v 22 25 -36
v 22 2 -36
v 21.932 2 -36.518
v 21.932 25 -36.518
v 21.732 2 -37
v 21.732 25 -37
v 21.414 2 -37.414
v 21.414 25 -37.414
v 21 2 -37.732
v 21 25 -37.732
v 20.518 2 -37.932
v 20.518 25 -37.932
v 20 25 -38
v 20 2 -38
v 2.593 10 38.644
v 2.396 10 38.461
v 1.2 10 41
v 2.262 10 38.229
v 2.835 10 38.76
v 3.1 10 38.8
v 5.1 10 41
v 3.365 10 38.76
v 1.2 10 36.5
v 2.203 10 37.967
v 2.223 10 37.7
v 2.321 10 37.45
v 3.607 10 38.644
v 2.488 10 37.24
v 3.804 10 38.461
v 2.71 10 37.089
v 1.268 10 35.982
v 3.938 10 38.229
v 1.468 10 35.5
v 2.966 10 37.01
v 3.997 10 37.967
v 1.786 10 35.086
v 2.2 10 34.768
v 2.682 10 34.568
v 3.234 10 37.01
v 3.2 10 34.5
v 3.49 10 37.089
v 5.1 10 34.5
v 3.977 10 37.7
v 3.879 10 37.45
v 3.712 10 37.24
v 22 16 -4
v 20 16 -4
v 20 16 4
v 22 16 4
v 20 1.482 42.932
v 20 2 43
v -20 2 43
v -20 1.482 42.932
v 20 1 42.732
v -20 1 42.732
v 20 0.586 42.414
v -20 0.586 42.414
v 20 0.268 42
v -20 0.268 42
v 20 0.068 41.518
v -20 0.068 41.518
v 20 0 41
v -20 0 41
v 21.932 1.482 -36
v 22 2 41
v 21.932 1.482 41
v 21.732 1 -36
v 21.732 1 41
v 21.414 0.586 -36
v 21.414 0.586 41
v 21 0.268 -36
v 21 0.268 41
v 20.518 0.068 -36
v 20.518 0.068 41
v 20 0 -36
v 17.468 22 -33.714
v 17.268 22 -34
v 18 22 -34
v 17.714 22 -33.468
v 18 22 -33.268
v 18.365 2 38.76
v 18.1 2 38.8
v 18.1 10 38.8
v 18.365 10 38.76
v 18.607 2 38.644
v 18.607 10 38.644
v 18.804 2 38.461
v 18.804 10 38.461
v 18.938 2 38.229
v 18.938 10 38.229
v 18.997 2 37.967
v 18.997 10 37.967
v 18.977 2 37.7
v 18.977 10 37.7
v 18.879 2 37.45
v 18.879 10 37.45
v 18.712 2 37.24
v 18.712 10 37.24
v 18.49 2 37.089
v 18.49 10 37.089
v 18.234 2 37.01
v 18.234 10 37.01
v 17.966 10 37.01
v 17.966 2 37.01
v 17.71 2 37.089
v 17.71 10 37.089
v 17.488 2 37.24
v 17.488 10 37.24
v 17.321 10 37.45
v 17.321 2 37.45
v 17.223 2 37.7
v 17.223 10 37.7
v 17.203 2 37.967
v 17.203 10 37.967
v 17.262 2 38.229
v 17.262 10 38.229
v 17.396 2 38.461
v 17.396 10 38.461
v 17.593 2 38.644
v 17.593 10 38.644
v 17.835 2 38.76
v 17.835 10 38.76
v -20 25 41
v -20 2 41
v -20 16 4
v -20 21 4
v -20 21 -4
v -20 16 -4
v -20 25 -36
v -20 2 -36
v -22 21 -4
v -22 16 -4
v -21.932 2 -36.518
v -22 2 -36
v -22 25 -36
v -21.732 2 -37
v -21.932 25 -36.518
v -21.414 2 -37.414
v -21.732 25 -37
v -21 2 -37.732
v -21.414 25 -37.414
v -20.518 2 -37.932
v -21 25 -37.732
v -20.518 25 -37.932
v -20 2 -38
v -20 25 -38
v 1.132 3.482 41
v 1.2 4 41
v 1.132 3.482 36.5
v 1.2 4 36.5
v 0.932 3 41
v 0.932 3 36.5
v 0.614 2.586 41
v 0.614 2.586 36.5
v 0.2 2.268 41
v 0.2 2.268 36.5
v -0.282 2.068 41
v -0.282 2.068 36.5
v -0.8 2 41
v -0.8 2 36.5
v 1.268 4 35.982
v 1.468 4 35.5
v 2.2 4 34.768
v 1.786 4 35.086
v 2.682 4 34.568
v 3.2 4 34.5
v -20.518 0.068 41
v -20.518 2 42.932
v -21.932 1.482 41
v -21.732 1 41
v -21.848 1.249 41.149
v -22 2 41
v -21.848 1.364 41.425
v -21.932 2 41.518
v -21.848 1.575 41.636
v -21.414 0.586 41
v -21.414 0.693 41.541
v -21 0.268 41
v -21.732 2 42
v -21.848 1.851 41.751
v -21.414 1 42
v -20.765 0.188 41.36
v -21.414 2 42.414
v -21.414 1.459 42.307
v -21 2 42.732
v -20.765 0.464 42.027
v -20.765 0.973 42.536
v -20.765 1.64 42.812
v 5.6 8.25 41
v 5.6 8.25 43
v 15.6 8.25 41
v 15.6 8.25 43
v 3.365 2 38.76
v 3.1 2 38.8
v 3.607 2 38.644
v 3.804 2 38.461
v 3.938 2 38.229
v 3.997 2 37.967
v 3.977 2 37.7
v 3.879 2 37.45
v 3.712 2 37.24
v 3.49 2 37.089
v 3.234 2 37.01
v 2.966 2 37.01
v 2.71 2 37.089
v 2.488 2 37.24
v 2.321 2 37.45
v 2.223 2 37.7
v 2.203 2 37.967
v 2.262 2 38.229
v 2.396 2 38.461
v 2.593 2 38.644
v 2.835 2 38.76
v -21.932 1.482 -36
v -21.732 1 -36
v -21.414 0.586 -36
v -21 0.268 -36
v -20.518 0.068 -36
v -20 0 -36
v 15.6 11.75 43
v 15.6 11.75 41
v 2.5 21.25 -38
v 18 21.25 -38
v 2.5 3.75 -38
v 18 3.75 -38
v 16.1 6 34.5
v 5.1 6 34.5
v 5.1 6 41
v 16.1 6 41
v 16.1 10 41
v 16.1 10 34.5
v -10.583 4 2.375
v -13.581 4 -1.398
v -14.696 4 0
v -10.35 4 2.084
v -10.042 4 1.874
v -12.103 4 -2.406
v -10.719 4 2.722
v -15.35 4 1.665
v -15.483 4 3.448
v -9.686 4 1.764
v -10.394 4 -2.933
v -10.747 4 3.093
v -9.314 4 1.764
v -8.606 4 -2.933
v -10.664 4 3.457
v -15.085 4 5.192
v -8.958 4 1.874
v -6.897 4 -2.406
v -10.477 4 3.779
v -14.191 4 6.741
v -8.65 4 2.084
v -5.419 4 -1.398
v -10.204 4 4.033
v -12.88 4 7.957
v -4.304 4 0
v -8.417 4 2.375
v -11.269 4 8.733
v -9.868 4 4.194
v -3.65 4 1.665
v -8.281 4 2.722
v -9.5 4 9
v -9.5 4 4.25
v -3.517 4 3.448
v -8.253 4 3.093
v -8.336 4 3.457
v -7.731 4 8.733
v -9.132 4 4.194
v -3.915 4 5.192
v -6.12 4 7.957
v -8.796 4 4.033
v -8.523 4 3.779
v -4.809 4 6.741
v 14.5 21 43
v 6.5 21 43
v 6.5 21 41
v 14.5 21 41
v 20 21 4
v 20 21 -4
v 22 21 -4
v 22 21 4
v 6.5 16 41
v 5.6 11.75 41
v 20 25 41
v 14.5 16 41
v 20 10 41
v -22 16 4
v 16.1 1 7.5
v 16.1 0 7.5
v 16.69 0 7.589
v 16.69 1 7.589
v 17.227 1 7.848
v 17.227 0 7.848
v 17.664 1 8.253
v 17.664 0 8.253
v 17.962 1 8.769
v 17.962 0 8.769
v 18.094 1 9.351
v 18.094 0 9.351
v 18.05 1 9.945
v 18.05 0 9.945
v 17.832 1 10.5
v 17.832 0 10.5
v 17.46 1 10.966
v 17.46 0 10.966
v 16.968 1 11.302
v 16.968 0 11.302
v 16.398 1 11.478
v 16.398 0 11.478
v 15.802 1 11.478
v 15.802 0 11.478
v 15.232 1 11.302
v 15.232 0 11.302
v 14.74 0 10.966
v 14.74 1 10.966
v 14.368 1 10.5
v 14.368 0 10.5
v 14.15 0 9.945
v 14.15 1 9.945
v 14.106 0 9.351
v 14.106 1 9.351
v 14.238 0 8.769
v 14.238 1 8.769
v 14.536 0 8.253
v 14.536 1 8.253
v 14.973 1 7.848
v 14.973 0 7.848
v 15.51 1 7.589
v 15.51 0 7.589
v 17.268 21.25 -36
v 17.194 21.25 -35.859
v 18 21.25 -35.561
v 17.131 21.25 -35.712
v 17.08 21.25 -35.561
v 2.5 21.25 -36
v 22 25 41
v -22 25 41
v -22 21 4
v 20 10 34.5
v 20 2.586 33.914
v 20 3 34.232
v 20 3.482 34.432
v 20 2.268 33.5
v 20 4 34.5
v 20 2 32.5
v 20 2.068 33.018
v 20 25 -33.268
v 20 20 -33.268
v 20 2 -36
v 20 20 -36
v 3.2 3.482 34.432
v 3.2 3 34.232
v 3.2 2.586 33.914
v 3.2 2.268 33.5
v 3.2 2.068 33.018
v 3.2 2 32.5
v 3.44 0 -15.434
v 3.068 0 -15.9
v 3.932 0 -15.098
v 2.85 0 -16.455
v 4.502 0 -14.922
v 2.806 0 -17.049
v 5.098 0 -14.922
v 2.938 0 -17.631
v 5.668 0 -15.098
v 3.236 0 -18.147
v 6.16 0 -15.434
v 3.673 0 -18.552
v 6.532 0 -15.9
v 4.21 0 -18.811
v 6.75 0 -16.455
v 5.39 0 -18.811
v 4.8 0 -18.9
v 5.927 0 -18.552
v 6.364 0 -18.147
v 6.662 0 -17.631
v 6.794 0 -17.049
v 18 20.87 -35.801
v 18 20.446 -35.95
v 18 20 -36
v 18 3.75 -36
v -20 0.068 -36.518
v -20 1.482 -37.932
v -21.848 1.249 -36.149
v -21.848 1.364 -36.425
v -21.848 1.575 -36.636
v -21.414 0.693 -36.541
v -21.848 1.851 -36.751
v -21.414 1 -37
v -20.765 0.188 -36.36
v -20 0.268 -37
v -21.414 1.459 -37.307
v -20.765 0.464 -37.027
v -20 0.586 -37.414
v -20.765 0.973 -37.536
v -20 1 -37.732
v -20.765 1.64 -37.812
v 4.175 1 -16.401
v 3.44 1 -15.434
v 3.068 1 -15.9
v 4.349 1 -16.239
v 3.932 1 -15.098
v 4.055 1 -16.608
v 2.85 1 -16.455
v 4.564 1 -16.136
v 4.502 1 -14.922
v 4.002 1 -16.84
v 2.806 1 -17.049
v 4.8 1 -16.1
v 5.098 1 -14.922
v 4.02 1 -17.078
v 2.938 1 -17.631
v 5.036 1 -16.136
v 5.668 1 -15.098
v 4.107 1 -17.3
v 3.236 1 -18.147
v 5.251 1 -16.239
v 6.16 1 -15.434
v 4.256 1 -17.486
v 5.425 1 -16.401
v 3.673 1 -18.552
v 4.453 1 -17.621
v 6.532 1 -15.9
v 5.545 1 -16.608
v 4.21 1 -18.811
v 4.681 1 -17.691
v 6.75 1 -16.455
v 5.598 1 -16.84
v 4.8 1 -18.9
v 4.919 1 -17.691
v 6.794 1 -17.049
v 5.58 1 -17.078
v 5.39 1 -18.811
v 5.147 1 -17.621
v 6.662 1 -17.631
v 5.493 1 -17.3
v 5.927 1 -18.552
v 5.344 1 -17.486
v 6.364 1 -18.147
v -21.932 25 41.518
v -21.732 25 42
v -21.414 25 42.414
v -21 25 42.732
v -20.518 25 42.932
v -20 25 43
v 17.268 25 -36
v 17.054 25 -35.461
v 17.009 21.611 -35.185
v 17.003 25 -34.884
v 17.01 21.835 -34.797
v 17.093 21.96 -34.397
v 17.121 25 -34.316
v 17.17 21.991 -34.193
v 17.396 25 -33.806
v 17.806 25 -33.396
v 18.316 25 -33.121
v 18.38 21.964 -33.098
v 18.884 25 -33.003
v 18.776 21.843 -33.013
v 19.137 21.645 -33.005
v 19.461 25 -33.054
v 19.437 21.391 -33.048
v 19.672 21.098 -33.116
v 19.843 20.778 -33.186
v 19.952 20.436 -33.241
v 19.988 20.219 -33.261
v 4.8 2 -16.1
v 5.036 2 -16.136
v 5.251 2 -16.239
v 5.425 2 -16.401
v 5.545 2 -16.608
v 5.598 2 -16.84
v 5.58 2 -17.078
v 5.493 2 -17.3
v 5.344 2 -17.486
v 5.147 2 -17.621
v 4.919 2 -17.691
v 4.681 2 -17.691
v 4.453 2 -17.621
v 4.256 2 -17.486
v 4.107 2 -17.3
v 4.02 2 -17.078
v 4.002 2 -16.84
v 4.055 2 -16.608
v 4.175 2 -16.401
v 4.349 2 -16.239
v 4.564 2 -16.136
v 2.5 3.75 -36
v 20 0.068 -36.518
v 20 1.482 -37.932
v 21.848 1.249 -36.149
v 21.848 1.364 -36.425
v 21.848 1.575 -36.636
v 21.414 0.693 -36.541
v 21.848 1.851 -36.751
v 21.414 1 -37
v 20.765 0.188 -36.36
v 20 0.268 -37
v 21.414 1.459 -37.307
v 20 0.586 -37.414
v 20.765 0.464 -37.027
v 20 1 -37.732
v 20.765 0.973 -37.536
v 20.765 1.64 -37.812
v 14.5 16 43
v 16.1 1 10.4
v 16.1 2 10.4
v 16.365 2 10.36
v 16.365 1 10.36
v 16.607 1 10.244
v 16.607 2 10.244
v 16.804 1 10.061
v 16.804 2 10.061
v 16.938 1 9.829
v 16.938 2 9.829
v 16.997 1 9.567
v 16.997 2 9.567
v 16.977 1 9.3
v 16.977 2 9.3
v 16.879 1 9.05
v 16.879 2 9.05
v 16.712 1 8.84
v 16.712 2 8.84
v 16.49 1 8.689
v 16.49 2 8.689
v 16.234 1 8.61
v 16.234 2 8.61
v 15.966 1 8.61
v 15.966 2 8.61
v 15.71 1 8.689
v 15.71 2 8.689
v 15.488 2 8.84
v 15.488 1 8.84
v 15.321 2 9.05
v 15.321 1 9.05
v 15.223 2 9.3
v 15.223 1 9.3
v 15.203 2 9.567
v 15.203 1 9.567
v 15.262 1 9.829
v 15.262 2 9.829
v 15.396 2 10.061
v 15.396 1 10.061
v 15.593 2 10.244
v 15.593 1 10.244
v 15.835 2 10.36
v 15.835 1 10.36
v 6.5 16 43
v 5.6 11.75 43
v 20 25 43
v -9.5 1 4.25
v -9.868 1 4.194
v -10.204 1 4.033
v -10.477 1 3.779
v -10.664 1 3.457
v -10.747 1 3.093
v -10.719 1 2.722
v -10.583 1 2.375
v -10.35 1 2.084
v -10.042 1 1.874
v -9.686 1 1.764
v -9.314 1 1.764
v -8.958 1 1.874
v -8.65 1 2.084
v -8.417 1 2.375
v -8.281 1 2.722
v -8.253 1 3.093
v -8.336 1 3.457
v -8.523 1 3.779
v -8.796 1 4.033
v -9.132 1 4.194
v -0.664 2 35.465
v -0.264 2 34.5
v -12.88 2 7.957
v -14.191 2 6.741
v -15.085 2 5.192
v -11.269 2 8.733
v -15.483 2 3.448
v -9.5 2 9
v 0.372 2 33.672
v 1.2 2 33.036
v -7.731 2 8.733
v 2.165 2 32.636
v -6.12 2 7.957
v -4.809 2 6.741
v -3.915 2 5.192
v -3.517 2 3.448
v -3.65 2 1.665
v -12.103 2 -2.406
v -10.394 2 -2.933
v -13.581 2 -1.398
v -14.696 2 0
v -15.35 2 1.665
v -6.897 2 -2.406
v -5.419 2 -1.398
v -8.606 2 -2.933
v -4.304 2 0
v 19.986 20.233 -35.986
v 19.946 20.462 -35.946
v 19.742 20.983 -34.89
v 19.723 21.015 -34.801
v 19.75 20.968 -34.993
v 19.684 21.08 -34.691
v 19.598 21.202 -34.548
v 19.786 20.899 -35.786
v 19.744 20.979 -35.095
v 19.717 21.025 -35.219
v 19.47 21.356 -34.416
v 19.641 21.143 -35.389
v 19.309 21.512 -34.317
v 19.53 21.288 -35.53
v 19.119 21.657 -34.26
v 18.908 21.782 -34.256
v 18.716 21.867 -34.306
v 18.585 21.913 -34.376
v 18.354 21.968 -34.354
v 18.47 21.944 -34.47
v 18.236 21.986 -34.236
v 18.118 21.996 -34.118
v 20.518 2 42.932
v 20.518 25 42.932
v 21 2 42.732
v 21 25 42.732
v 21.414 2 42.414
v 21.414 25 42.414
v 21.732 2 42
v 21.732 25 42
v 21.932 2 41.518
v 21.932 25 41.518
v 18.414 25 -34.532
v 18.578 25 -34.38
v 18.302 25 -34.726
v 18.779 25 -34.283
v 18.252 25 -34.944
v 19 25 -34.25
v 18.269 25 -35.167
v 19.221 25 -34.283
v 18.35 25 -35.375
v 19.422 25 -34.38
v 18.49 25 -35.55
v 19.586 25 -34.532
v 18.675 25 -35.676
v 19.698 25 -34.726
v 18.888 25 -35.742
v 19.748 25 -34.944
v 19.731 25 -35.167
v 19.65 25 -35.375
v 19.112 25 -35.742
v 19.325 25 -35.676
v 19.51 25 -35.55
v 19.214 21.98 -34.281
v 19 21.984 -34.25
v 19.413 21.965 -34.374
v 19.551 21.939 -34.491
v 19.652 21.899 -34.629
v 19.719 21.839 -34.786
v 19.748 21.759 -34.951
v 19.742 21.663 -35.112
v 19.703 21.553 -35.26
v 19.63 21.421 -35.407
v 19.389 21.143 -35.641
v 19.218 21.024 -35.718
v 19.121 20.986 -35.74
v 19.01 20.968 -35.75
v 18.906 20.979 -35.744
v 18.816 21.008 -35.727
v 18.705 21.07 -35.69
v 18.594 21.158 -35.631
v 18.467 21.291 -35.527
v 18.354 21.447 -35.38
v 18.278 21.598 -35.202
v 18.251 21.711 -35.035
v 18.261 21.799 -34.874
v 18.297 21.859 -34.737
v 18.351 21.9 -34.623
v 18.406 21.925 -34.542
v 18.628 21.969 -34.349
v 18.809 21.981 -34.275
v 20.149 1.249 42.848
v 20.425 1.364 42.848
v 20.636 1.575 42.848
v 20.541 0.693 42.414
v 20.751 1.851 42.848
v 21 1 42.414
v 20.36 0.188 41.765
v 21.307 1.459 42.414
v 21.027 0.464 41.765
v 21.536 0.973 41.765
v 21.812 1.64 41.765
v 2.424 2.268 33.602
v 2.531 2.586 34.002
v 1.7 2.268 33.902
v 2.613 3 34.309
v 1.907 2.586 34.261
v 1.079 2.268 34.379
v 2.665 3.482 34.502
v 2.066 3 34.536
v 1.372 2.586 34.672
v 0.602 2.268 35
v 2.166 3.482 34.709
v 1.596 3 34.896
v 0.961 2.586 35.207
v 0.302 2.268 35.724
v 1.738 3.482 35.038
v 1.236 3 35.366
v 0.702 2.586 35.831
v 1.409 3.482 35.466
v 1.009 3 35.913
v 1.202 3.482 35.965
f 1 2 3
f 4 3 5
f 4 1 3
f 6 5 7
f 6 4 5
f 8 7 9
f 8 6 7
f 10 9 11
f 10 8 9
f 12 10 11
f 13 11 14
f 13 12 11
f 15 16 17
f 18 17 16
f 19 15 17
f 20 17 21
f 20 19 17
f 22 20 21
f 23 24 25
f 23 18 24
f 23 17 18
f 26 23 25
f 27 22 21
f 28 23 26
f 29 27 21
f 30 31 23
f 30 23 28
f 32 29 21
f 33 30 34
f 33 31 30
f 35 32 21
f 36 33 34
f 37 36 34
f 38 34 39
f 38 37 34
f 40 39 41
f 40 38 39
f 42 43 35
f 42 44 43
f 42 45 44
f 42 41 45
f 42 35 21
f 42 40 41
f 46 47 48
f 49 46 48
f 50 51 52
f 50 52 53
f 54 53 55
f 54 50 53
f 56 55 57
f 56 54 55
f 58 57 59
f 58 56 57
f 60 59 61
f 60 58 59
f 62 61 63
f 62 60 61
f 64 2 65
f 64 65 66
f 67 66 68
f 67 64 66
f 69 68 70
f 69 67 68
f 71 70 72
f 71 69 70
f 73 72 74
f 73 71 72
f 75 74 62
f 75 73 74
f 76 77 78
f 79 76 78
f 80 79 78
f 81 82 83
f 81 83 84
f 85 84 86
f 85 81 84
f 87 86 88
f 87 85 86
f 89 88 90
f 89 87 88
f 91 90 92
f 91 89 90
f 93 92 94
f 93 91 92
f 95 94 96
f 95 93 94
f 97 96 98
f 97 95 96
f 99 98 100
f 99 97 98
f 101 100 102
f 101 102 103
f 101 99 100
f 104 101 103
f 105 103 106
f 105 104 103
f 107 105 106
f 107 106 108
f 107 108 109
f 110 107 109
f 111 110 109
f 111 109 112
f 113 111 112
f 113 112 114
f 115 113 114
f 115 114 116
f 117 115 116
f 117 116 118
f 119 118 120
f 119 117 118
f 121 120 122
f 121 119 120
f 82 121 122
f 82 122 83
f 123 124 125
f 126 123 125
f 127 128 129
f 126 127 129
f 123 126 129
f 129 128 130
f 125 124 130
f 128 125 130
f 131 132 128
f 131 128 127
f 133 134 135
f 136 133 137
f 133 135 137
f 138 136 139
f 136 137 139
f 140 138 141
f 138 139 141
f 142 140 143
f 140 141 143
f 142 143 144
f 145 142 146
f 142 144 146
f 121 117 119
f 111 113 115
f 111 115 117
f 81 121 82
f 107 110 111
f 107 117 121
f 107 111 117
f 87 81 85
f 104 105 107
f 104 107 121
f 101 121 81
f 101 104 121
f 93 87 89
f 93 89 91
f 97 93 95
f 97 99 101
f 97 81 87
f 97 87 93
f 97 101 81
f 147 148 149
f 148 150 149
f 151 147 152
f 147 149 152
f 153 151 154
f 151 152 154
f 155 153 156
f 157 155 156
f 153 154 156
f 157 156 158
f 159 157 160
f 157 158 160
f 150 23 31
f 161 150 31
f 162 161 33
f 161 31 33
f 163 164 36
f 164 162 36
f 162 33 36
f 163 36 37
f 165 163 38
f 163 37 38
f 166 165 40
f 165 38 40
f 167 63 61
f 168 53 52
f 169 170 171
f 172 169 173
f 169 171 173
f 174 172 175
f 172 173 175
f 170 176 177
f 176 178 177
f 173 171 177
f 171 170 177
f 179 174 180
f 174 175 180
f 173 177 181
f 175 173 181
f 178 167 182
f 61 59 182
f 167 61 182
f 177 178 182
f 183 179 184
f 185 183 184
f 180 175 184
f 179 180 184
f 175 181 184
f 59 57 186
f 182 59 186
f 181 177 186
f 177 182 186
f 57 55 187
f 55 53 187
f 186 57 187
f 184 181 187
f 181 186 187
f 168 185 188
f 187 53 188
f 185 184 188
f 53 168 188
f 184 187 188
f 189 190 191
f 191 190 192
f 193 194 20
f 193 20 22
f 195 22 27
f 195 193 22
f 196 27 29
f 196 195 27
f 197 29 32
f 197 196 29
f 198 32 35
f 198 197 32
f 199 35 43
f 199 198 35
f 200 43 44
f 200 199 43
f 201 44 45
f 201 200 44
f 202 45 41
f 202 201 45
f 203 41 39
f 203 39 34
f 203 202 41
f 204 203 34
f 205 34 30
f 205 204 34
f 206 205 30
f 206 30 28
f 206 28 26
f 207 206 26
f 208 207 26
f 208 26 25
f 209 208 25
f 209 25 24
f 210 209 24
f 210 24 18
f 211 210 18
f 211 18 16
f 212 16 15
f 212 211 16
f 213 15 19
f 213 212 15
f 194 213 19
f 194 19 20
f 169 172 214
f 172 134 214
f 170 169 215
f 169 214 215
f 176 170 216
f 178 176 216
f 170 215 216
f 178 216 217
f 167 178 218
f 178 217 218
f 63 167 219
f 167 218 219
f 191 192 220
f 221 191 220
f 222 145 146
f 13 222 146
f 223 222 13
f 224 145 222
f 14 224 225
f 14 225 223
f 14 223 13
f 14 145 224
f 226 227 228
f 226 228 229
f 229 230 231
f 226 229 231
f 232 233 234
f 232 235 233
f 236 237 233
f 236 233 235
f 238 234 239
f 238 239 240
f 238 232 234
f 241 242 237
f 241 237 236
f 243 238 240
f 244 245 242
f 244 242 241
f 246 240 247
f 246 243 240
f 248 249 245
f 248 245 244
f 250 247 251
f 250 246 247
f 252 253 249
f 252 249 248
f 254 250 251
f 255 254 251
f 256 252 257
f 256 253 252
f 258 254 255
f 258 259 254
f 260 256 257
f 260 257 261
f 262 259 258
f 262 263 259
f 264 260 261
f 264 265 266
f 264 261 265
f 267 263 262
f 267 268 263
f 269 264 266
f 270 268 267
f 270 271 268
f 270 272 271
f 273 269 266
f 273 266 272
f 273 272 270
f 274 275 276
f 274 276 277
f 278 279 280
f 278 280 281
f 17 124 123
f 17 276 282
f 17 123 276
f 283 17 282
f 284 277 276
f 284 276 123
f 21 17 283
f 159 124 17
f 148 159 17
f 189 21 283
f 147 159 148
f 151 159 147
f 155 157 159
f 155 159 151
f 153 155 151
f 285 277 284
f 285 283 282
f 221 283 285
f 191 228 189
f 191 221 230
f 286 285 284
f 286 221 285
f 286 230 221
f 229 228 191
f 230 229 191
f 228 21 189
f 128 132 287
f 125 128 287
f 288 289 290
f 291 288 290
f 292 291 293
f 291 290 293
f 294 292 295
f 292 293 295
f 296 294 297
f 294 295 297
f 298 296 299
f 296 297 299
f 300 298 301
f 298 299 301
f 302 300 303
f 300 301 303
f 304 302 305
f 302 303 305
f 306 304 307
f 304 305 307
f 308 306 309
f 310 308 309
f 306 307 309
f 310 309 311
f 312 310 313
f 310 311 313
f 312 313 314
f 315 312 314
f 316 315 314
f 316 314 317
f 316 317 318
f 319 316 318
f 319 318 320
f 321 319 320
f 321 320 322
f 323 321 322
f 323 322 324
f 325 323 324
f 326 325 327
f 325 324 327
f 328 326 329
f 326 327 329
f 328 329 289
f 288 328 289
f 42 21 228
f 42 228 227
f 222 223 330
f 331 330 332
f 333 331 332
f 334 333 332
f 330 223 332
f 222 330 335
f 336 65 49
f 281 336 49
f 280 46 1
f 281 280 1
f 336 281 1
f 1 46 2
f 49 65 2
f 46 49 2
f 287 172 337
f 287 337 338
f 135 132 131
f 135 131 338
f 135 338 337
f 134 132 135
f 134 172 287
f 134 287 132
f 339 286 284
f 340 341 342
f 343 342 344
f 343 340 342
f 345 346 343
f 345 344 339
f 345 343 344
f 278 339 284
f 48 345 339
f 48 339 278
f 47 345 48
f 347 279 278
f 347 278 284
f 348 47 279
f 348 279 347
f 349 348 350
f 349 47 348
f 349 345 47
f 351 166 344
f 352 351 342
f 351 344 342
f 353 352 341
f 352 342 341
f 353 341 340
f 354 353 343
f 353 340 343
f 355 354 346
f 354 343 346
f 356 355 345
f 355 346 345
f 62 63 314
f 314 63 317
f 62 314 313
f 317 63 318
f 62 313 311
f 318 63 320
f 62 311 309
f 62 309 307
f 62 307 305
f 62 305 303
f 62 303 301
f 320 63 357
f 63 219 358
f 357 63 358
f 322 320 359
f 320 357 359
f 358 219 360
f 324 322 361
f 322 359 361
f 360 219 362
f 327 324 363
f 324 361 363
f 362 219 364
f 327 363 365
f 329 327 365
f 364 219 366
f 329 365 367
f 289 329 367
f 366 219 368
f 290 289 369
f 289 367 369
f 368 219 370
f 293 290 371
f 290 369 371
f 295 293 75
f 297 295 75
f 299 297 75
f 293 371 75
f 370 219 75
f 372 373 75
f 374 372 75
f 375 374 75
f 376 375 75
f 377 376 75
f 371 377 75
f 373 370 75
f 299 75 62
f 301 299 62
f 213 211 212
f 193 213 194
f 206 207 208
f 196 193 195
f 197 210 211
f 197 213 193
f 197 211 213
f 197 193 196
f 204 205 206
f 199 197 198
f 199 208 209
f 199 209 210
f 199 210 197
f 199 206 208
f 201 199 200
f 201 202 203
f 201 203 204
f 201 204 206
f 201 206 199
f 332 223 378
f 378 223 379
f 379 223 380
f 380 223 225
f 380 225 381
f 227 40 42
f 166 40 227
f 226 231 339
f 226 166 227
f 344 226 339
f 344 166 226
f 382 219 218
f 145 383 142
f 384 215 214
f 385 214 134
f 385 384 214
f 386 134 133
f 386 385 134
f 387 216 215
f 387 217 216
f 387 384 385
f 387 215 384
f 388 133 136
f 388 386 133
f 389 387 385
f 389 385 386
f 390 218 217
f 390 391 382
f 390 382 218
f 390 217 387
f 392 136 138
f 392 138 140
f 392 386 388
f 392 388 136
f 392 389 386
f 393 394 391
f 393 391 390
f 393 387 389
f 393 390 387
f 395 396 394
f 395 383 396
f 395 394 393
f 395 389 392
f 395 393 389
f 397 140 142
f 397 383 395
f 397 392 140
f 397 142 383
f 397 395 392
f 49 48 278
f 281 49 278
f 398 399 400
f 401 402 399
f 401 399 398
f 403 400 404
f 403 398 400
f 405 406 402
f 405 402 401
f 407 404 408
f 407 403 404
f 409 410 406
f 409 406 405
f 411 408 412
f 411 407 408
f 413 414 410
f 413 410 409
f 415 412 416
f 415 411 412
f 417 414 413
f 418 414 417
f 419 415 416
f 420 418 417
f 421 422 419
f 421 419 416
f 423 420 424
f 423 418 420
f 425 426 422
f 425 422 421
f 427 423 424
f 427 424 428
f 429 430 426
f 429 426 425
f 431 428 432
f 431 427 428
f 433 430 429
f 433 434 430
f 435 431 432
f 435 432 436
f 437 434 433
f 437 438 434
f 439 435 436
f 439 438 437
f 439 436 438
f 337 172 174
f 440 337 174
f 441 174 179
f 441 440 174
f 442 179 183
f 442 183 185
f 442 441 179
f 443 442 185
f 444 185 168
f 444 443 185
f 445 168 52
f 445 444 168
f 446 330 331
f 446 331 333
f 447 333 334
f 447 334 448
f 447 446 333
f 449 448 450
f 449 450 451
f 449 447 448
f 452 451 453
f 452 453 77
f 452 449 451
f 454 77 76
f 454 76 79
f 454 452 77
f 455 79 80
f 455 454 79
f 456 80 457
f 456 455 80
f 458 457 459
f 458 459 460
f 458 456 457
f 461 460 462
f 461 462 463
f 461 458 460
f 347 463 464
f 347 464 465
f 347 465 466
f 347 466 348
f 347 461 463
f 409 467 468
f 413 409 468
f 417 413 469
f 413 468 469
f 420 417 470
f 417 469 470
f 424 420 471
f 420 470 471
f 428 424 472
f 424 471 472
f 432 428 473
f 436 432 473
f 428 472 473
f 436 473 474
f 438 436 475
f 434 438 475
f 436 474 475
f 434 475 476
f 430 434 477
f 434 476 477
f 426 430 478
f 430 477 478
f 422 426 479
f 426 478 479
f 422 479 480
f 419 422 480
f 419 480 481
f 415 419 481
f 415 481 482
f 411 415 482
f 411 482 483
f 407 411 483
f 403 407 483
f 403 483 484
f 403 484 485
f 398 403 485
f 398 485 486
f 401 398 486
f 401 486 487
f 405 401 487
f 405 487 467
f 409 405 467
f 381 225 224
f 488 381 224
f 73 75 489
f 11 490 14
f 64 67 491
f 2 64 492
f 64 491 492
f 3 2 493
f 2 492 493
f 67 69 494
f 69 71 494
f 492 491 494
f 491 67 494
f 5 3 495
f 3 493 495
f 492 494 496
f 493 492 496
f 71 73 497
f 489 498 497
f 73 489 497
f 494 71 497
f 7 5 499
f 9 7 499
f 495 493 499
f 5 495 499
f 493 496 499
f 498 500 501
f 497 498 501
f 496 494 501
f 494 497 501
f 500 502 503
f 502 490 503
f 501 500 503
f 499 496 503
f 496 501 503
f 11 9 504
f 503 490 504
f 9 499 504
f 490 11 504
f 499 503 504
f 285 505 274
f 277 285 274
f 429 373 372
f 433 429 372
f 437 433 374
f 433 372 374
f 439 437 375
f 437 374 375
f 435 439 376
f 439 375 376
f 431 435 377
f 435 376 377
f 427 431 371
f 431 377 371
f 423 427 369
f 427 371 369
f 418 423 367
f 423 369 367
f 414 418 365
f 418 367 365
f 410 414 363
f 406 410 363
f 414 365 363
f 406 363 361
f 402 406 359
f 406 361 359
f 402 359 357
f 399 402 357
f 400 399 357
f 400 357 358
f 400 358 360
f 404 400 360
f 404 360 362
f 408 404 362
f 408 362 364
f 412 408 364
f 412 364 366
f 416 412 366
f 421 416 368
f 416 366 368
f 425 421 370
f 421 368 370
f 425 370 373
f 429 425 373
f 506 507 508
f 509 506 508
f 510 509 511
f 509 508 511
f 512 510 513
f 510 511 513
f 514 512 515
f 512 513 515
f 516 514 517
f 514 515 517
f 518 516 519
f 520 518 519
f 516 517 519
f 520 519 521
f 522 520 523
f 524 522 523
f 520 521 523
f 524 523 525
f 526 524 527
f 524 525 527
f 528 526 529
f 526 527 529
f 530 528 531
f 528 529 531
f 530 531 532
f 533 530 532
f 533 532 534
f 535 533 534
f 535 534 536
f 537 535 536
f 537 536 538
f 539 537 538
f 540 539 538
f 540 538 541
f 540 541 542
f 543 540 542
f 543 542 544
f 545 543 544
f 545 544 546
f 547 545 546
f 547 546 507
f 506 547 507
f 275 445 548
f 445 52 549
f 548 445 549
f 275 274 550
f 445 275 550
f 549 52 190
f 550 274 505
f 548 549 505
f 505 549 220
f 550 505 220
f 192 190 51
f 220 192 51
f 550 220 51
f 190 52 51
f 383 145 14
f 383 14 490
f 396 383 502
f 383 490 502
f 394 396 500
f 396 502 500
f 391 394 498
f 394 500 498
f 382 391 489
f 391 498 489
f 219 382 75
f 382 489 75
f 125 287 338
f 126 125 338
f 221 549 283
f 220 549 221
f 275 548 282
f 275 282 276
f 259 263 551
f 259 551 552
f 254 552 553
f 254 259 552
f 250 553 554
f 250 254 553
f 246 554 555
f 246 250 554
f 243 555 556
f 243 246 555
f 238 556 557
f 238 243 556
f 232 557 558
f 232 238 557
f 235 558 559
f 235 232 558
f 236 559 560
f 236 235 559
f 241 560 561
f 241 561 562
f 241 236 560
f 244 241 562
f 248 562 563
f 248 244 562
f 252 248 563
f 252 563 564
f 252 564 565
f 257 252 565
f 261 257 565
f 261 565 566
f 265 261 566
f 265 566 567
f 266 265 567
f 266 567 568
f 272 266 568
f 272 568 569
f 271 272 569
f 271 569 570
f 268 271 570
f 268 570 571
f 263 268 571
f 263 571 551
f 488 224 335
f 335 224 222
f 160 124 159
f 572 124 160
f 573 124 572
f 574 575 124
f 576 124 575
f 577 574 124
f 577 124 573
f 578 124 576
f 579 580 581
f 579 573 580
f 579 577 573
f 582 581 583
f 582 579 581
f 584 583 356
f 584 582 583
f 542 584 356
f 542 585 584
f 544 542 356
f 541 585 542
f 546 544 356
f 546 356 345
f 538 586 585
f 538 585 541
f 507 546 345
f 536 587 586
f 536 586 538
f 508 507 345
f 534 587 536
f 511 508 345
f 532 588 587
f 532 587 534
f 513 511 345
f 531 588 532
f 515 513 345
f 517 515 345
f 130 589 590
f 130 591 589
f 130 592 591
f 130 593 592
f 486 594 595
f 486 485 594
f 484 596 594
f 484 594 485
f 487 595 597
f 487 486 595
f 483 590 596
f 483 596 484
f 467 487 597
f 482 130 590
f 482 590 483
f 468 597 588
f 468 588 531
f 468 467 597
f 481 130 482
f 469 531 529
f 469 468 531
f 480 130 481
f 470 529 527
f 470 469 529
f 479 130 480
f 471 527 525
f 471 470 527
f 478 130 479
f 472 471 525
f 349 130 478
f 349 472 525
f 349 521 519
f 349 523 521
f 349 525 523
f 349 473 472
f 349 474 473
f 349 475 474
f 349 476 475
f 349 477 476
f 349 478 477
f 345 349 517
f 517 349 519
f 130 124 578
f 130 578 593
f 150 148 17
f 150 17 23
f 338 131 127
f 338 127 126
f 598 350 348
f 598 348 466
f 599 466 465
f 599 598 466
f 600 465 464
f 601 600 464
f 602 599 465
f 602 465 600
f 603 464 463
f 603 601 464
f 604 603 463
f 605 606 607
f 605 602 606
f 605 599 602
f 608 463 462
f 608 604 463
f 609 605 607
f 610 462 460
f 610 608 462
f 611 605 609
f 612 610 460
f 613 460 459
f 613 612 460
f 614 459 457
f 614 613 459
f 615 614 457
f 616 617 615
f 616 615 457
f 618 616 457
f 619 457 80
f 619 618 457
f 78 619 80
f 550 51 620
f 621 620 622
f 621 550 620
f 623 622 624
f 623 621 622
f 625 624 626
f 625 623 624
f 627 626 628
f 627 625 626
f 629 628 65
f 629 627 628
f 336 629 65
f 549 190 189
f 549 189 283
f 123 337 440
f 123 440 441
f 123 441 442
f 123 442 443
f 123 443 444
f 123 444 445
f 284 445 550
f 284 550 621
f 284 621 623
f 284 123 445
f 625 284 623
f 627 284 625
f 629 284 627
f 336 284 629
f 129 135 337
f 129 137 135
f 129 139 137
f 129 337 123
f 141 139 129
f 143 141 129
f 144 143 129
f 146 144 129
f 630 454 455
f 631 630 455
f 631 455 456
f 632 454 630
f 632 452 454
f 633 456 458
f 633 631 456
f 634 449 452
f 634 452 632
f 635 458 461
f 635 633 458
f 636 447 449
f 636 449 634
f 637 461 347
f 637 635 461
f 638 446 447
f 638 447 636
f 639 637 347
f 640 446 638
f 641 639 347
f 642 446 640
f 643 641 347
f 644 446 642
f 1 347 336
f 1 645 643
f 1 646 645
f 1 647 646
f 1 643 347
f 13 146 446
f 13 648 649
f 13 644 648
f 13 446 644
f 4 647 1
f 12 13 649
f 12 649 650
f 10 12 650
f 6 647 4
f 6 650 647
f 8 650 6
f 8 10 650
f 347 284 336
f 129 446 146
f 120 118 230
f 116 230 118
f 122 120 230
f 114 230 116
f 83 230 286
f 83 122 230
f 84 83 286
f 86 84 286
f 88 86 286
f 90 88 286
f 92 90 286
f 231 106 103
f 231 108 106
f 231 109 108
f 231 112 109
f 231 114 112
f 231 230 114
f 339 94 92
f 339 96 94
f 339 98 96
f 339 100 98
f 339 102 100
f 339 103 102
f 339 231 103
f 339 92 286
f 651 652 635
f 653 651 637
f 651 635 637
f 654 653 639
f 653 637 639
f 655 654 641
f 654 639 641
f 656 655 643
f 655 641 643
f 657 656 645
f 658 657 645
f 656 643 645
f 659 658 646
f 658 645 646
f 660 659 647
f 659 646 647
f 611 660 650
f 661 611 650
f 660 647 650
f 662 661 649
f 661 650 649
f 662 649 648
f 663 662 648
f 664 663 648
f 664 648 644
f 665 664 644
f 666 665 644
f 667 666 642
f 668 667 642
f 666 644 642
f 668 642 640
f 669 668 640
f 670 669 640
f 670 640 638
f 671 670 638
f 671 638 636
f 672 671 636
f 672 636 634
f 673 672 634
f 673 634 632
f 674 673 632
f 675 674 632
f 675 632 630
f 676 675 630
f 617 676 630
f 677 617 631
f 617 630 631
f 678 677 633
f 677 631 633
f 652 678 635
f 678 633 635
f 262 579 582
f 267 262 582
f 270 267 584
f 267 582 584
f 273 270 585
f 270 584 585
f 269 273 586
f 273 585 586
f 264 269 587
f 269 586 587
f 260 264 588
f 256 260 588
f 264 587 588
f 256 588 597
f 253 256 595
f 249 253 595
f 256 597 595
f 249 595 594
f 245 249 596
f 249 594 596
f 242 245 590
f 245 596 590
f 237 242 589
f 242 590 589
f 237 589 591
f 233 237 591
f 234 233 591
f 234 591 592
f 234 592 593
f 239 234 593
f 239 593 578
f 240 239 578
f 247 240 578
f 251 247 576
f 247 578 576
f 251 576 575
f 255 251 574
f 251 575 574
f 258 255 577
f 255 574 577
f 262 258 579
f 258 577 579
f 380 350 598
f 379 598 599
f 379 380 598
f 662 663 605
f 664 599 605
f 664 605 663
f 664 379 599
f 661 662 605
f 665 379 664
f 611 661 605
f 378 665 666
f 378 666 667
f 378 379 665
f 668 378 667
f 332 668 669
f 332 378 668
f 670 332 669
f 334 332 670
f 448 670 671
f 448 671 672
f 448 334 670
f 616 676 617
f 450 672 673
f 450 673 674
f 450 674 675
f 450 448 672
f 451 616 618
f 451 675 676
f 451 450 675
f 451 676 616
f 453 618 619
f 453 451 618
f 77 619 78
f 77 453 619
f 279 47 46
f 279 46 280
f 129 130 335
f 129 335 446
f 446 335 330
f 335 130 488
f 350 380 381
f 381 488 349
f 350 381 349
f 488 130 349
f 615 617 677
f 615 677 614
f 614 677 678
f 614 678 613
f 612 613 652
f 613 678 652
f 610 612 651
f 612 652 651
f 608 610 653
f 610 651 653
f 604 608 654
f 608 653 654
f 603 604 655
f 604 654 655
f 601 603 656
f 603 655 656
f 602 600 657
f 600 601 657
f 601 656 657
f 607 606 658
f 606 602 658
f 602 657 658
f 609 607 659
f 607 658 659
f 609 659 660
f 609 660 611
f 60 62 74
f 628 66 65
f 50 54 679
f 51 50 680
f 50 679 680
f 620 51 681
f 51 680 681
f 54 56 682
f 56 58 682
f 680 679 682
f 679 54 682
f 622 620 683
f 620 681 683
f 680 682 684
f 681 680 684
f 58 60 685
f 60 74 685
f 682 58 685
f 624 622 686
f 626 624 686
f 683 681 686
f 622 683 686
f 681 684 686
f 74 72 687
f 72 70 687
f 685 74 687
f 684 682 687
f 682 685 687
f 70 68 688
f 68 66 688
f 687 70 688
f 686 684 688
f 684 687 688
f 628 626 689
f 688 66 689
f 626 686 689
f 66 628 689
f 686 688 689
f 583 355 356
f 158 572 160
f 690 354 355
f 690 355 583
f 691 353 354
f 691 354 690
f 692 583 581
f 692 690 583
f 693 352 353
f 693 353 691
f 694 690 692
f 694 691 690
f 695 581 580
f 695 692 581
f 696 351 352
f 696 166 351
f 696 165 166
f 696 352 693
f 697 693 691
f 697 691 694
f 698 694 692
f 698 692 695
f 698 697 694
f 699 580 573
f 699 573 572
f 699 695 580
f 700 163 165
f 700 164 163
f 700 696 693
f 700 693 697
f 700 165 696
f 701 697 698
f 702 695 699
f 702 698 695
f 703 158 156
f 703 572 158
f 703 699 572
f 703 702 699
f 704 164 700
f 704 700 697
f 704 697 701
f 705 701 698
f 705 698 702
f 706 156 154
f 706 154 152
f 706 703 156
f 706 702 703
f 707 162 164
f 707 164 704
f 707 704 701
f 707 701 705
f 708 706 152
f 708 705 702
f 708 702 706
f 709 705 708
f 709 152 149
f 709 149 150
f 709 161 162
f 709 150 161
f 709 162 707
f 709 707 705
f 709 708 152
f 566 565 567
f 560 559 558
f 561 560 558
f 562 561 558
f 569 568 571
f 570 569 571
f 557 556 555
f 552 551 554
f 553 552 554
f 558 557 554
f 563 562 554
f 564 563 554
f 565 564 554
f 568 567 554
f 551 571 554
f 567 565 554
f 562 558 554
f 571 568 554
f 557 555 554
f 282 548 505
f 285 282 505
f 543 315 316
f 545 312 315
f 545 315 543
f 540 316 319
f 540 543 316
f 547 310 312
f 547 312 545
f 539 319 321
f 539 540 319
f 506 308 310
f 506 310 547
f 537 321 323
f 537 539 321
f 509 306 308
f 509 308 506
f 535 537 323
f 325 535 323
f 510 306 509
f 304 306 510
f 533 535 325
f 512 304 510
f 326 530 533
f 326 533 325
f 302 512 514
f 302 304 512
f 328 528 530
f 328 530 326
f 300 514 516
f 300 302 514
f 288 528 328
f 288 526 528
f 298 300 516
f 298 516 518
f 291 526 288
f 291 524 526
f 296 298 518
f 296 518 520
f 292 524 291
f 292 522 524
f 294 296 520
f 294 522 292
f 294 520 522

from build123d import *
from build123d.topology import SkipClean

# Parameters (mm, degrees)
SKETCH_1_W           = 44
SKETCH_1_H           = 81
EXTRUDE_1_DEPTH      = 25
SHELL_1_T            = -2
FILLET_1_R           = 2
SKETCH_2_R           = 0.8
SKETCH_2_R_2         = 0.9
CUT_EXTRUDE_1_DEPTH  = 24
SKETCH_3_R           = 1.25
CUT_EXTRUDE_2_DEPTH  = 24
SKETCH_4_R           = 6
EXTRUDE_2_DEPTH      = 2
CUT_EXTRUDE_START    = -13.2
SKETCH_6_R           = 1.25
CUT_EXTRUDE_4_DEPTH  = 13.2
SKETCH_7_W           = 15.5
SKETCH_7_H           = 17.5
CUT_EXTRUDE_5_DEPTH  = 13.2
SKETCH_9_W           = 18.8
SKETCH_9_H           = 6.5
SKETCH_9_R           = 0.9
EXTRUDE_3_DEPTH      = 8
SKETCH_11_W          = 11
SKETCH_11_H          = 6.5
CUT_EXTRUDE_6_DEPTH  = 4
SKETCH_12_W          = 10
SKETCH_12_H          = 3.5
CUT_EXTRUDE_7_DEPTH  = 4
FILLET_2_R           = 2
EXTRUDE_START        = -1
SKETCH_14_R          = 1.25
EXTRUDE_4_DEPTH      = 1
SKETCH_15_R          = 2
CUT_EXTRUDE_8_DEPTH  = 1
SKETCH_16_W          = 8
SKETCH_16_H          = 5
CUT_EXTRUDE_9_DEPTH  = 59
SKETCH_17_R          = 2
EXTRUDE_5_DEPTH      = 3
SKETCH_18_R          = 0.75
CUT_EXTRUDE_10_DEPTH = 3
FILLET_3_R           = 2
SKETCH_19_W          = 8
SKETCH_19_H          = 5
CUT_EXTRUDE_11_DEPTH = 3


with BuildPart() as part:
    # 草图1 → 凸台-拉伸1 (new body)
    with BuildSketch(Plane(origin=(0, 0, 0), x_dir=(1, 0, 0), z_dir=(0, 1, 0))):
        with Locations((0, -2.5)):
            Rectangle(SKETCH_1_W, SKETCH_1_H)
    extrude(amount=EXTRUDE_1_DEPTH)

    # 抽壳1
    shell_1_openings = [part.faces().sort_by_distance(p)[0] for p in [
        (0, 25, 2.5),
    ]]
    offset(amount=SHELL_1_T, openings=shell_1_openings, kind=Kind.INTERSECTION)

    # 圆角1
    fillet_1_edges = [part.edges().sort_by_distance(p)[0] for p in [
        (0, 0, -38),
        (22, 0, 2.5),
        (0, 0, 43),
        (-22, 0, 2.5),
        (-22, 12.5, -38),
        (22, 12.5, -38),
        (22, 12.5, 43),
        (-22, 12.5, 43),
    ]]
    fillet(fillet_1_edges, radius=FILLET_1_R)

    # 草图2 → 切除-拉伸1 (cut)
    with BuildSketch(Plane(origin=(0, 2, 0), x_dir=(1, 0, 0), z_dir=(0, 1, 0))):
        with Locations(Location((4.8, 16.9, 0), (0, 0, 270))):
            Circle(SKETCH_2_R)
        with Locations(Location((16.1, -9.5, 0), (0, 0, 270))):
            Circle(SKETCH_2_R_2)
    extrude(amount=-CUT_EXTRUDE_1_DEPTH, mode=Mode.SUBTRACT)

    # 草图3 → 切除-拉伸2 (cut)
    with BuildSketch(Plane(origin=(0, 2, 0), x_dir=(1, 0, 0), z_dir=(0, 1, 0))):
        with Locations(Location((-9.5, -3, 0), (0, 0, 270))):
            Circle(SKETCH_3_R)
    extrude(amount=-CUT_EXTRUDE_2_DEPTH, mode=Mode.SUBTRACT)

    # 草图4 → 凸台-拉伸2 (add)
    with BuildSketch(Plane(origin=(0, 2, 0), x_dir=(1, 0, 0), z_dir=(0, 1, 0))):
        with Locations(Location((-9.5, -3, 0), (0, 0, 270))):
            Circle(SKETCH_4_R)
    extrude(amount=EXTRUDE_2_DEPTH)

    # 草图6 → 切除-拉伸4 (cut)
    with BuildSketch(Plane.XZ.offset(CUT_EXTRUDE_START)):
        with Locations(Location((-9.5, 3, 0), (0, 0, 90))):
            Circle(SKETCH_6_R)
    extrude(amount=CUT_EXTRUDE_4_DEPTH, mode=Mode.SUBTRACT)

    # 草图7 → 切除-拉伸5 (cut)
    with BuildSketch(Plane(origin=(0, 0, -38), x_dir=(-1, 0, 0), z_dir=(0, 0, -1))):
        with Locations((-10.25, 12.5)):
            Rectangle(SKETCH_7_W, SKETCH_7_H)
    extrude(amount=-CUT_EXTRUDE_5_DEPTH, mode=Mode.SUBTRACT)

    # 草图9 → 凸台-拉伸3 (add)
    with BuildSketch(Plane(origin=(0, 2, 0), x_dir=(1, 0, 0), z_dir=(0, 1, 0))):
        with Locations((10.6, -37.75)):
            Rectangle(SKETCH_9_W, SKETCH_9_H)
        with Locations(Location((18.1, -37.9, 0), (0, 0, 270))):
            Circle(SKETCH_9_R, mode=Mode.SUBTRACT)
        with Locations(Location((3.1, -37.9, 0), (0, 0, 270))):
            Circle(SKETCH_9_R, mode=Mode.SUBTRACT)
    extrude(amount=EXTRUDE_3_DEPTH)

    # 草图11 → 切除-拉伸6 (cut)
    with BuildSketch(Plane(origin=(0, 10, 0), x_dir=(1, 0, 0), z_dir=(0, 1, 0))):
        with Locations((10.6, -37.75)):
            Rectangle(SKETCH_11_W, SKETCH_11_H)
    extrude(amount=-CUT_EXTRUDE_6_DEPTH, mode=Mode.SUBTRACT)

    # 草图12 → 切除-拉伸7 (cut)
    with BuildSketch(Plane.XY.offset(43)):
        with Locations((10.6, 10)):
            Rectangle(SKETCH_12_W, SKETCH_12_H)
    extrude(amount=-CUT_EXTRUDE_7_DEPTH, mode=Mode.SUBTRACT)

    # 圆角2
    fillet_2_edges = [part.edges().sort_by_distance(p)[0] for p in [
        (10.6, 2, 34.5),
        (1.2, 2, 37.75),
        (1.2, 6, 34.5),
    ]]
    fillet(fillet_2_edges, radius=FILLET_2_R)

    # 草图14 → 凸台-拉伸4 (add)
    with BuildSketch(Plane.XZ.offset(EXTRUDE_START)):
        with Locations(Location((-9.5, 3, 0), (0, 0, 90))):
            Circle(SKETCH_14_R)
    extrude(amount=EXTRUDE_4_DEPTH)

    # 草图15 → 切除-拉伸8 (cut)
    with BuildSketch(Plane.XZ):
        with Locations(Location((16.1, 9.5, 0), (0, 0, 270))):
            Circle(SKETCH_15_R)
        with Locations(Location((4.8, -16.9, 0), (0, 0, 270))):
            Circle(SKETCH_15_R)
    extrude(amount=-CUT_EXTRUDE_8_DEPTH, mode=Mode.SUBTRACT)

    # 草图16 → 切除-拉伸9 (cut)
    with BuildSketch(Plane.ZY.offset(22)):
        with Locations((0, 18.5)):
            Rectangle(SKETCH_16_W, SKETCH_16_H)
    extrude(amount=-CUT_EXTRUDE_9_DEPTH, mode=Mode.SUBTRACT)

    # 草图17 → 凸台-拉伸5 (add)
    with BuildSketch(Plane(origin=(0, 25, 0), x_dir=(1, 0, 0), z_dir=(0, 1, 0))):
        with Locations((19, 35)):
            Circle(SKETCH_17_R)
    extrude(amount=-EXTRUDE_5_DEPTH)

    # 草图18 → 切除-拉伸10 (cut)
    with BuildSketch(Plane(origin=(0, 25, 0), x_dir=(1, 0, 0), z_dir=(0, 1, 0))):
        with Locations(Location((19, 35, 0), (0, 0, 270))):
            Circle(SKETCH_18_R)
    extrude(amount=-CUT_EXTRUDE_10_DEPTH, mode=Mode.SUBTRACT)

    # 圆角3
    # the kernel refuses this fillet: 2 mm, written as the material it adds along each edge
    with BuildSketch(Plane(origin=(12.267949192, 22, -36), x_dir=(0, -1, 0), z_dir=(1, 0, 0))) as fillet_3_piece_1_section:
        with BuildLine():
            CenterArc((FILLET_3_R, -FILLET_3_R), FILLET_3_R, 90, 90)
            Line((0, -FILLET_3_R), (0, 0))
            Line((0, 0), (FILLET_3_R, 0))
        make_face()
    fillet_3_piece_1 = extrude(amount=7.732050808, mode=Mode.PRIVATE)
    fillet_3_piece_1 = fillet_3_piece_1 & Plane(origin=(19, 21.743486993, -35), x_dir=(1, 0, 0), z_dir=(0, 1, 0)) * Cylinder(2, 24, mode=Mode.PRIVATE)
    fillet_3_piece_1 = split(fillet_3_piece_1, bisect_by=Plane(origin=(18, 21.743486993, -35.418577815), z_dir=(-1, 0, 0)), keep=Keep.TOP, mode=Mode.PRIVATE)
    fillet_3_piece_1 = split(fillet_3_piece_1, bisect_by=Plane(origin=(17.546708028, 21.25, -35.418577815), z_dir=(0, 1, 0)), keep=Keep.TOP, mode=Mode.PRIVATE)
    add(fillet_3_piece_1)
    with BuildSketch(Plane(origin=(12.267949192, 22, -36), x_dir=(0, -1, 0), z_dir=(1, 0, 0))) as fillet_3_piece_2_section:
        with BuildLine():
            CenterArc((FILLET_3_R, -FILLET_3_R), FILLET_3_R, 90, 90)
            Line((0, -FILLET_3_R), (0, 0))
            Line((0, 0), (FILLET_3_R, 0))
        make_face()
    fillet_3_piece_2 = extrude(amount=7.732050808, mode=Mode.PRIVATE)
    fillet_3_piece_2 = split(fillet_3_piece_2, bisect_by=Plane(origin=(18, 20.864048259, -35.911747477), z_dir=(1, 0, 0)), keep=Keep.TOP, mode=Mode.PRIVATE)
    fillet_3_piece_2 = split(fillet_3_piece_2, bisect_by=Plane(origin=(18.99999999, 21.25, -35.911747477), z_dir=(0, -1, 0)), keep=Keep.TOP, mode=Mode.PRIVATE)
    fillet_3_piece_2 = fillet_3_piece_2 - Plane(origin=(19, 20.864048259, -35), x_dir=(0, 0, 1), z_dir=(0, 1, 0)) * Cylinder(0.75, 24, mode=Mode.PRIVATE)
    add(fillet_3_piece_2)
    with BuildSketch(Plane(origin=(12.267949192, 22, -36), x_dir=(0, -1, 0), z_dir=(1, 0, 0))) as fillet_3_piece_3_section:
        with BuildLine():
            CenterArc((FILLET_3_R, -FILLET_3_R), FILLET_3_R, 90, 90)
            Line((0, -FILLET_3_R), (0, 0))
            Line((0, 0), (FILLET_3_R, 0))
        make_face()
    fillet_3_piece_3 = extrude(amount=7.732050808, mode=Mode.PRIVATE)
    fillet_3_piece_3 = split(fillet_3_piece_3, bisect_by=Plane(origin=(18, 21.475531477, -35.364676357), z_dir=(1, 0, 0)), keep=Keep.TOP, mode=Mode.PRIVATE)
    fillet_3_piece_3 = split(fillet_3_piece_3, bisect_by=Plane(origin=(19.666666667, 21.25, -35.364676357), z_dir=(0, 1, 0)), keep=Keep.TOP, mode=Mode.PRIVATE)
    fillet_3_piece_3 = fillet_3_piece_3 - Plane(origin=(19, 21.475531477, -35), x_dir=(0, 0, 1), z_dir=(0, 1, 0)) * Cylinder(0.75, 24, mode=Mode.PRIVATE)
    add(fillet_3_piece_3)
    with BuildSketch(Plane(origin=(12.267949192, 22, -36), x_dir=(0, -1, 0), z_dir=(1, 0, 0))) as fillet_3_piece_4_section:
        with BuildLine():
            CenterArc((FILLET_3_R, -FILLET_3_R), FILLET_3_R, 90, 90)
            Line((0, -FILLET_3_R), (0, 0))
            Line((0, 0), (FILLET_3_R, 0))
        make_face()
    fillet_3_piece_4 = extrude(amount=12.732050808, mode=Mode.PRIVATE)
    fillet_3_piece_4 = split(fillet_3_piece_4, bisect_by=Plane(origin=(20, 20.885178509, -35.897350533), z_dir=(1, 0, 0)), keep=Keep.TOP, mode=Mode.PRIVATE)
    fillet_3_piece_4 = fillet_3_piece_4 & Plane(origin=(19, 20.885178509, -35), x_dir=(1, 0, 0), z_dir=(0, 1, 0)) * Cylinder(2, 34, mode=Mode.PRIVATE)
    fillet_3_piece_4 = split(fillet_3_piece_4, bisect_by=Plane(origin=(20.391607497, 21.25, -35.897350533), z_dir=(0, -1, 0)), keep=Keep.TOP, mode=Mode.PRIVATE)
    add(fillet_3_piece_4)
    with BuildSketch(Plane(origin=(12.267949192, 22, -36), x_dir=(0, -1, 0), z_dir=(1, 0, 0))) as fillet_3_piece_5_section:
        with BuildLine():
            CenterArc((FILLET_3_R, -FILLET_3_R), FILLET_3_R, 90, 90)
            Line((0, -FILLET_3_R), (0, 0))
            Line((0, 0), (FILLET_3_R, 0))
        make_face()
    fillet_3_piece_5 = extrude(amount=12.732050808, mode=Mode.PRIVATE)
    fillet_3_piece_5 = split(fillet_3_piece_5, bisect_by=Plane(origin=(20, 21.743487033, -35.418577693), z_dir=(1, 0, 0)), keep=Keep.TOP, mode=Mode.PRIVATE)
    fillet_3_piece_5 = fillet_3_piece_5 & Plane(origin=(19, 21.743487033, -35), x_dir=(1, 0, 0), z_dir=(0, 1, 0)) * Cylinder(2, 34, mode=Mode.PRIVATE)
    fillet_3_piece_5 = split(fillet_3_piece_5, bisect_by=Plane(origin=(20.45329205, 21.25, -35.418577693), z_dir=(0, 1, 0)), keep=Keep.TOP, mode=Mode.PRIVATE)
    add(fillet_3_piece_5)
    with BuildSketch(Plane(origin=(20, 22, -41), x_dir=(0, -1, 0), z_dir=(0, 0, 1))) as fillet_3_piece_6_section:
        with BuildLine():
            CenterArc((FILLET_3_R, -FILLET_3_R), FILLET_3_R, 90, 90)
            Line((0, -FILLET_3_R), (0, 0))
            Line((0, 0), (FILLET_3_R, 0))
        make_face()
    fillet_3_piece_6 = extrude(amount=12.732050808, mode=Mode.PRIVATE)
    fillet_3_piece_6 = fillet_3_piece_6 & Plane(origin=(19, 21.575046731, -35), x_dir=(1, 0, 0), z_dir=(0, 1, 0)) * Cylinder(2, 34, mode=Mode.PRIVATE)
    fillet_3_piece_6 = fillet_3_piece_6 - Plane(origin=(19, 21.575046731, -35), x_dir=(0, 0, 1), z_dir=(0, 1, 0)) * Cylinder(0.75, 34, mode=Mode.PRIVATE)
    add(fillet_3_piece_6)

    # 草图19 → 切除-拉伸11 (cut)
    with SkipClean():  # the faces are left unmerged after this step: merging them gives an invalid solid
        with BuildSketch(Plane.XY.offset(43)):
            with Locations((10.5, 18.5)):
                Rectangle(SKETCH_19_W, SKETCH_19_H)
        extrude(amount=-CUT_EXTRUDE_11_DEPTH, mode=Mode.SUBTRACT)


solid = part.part
